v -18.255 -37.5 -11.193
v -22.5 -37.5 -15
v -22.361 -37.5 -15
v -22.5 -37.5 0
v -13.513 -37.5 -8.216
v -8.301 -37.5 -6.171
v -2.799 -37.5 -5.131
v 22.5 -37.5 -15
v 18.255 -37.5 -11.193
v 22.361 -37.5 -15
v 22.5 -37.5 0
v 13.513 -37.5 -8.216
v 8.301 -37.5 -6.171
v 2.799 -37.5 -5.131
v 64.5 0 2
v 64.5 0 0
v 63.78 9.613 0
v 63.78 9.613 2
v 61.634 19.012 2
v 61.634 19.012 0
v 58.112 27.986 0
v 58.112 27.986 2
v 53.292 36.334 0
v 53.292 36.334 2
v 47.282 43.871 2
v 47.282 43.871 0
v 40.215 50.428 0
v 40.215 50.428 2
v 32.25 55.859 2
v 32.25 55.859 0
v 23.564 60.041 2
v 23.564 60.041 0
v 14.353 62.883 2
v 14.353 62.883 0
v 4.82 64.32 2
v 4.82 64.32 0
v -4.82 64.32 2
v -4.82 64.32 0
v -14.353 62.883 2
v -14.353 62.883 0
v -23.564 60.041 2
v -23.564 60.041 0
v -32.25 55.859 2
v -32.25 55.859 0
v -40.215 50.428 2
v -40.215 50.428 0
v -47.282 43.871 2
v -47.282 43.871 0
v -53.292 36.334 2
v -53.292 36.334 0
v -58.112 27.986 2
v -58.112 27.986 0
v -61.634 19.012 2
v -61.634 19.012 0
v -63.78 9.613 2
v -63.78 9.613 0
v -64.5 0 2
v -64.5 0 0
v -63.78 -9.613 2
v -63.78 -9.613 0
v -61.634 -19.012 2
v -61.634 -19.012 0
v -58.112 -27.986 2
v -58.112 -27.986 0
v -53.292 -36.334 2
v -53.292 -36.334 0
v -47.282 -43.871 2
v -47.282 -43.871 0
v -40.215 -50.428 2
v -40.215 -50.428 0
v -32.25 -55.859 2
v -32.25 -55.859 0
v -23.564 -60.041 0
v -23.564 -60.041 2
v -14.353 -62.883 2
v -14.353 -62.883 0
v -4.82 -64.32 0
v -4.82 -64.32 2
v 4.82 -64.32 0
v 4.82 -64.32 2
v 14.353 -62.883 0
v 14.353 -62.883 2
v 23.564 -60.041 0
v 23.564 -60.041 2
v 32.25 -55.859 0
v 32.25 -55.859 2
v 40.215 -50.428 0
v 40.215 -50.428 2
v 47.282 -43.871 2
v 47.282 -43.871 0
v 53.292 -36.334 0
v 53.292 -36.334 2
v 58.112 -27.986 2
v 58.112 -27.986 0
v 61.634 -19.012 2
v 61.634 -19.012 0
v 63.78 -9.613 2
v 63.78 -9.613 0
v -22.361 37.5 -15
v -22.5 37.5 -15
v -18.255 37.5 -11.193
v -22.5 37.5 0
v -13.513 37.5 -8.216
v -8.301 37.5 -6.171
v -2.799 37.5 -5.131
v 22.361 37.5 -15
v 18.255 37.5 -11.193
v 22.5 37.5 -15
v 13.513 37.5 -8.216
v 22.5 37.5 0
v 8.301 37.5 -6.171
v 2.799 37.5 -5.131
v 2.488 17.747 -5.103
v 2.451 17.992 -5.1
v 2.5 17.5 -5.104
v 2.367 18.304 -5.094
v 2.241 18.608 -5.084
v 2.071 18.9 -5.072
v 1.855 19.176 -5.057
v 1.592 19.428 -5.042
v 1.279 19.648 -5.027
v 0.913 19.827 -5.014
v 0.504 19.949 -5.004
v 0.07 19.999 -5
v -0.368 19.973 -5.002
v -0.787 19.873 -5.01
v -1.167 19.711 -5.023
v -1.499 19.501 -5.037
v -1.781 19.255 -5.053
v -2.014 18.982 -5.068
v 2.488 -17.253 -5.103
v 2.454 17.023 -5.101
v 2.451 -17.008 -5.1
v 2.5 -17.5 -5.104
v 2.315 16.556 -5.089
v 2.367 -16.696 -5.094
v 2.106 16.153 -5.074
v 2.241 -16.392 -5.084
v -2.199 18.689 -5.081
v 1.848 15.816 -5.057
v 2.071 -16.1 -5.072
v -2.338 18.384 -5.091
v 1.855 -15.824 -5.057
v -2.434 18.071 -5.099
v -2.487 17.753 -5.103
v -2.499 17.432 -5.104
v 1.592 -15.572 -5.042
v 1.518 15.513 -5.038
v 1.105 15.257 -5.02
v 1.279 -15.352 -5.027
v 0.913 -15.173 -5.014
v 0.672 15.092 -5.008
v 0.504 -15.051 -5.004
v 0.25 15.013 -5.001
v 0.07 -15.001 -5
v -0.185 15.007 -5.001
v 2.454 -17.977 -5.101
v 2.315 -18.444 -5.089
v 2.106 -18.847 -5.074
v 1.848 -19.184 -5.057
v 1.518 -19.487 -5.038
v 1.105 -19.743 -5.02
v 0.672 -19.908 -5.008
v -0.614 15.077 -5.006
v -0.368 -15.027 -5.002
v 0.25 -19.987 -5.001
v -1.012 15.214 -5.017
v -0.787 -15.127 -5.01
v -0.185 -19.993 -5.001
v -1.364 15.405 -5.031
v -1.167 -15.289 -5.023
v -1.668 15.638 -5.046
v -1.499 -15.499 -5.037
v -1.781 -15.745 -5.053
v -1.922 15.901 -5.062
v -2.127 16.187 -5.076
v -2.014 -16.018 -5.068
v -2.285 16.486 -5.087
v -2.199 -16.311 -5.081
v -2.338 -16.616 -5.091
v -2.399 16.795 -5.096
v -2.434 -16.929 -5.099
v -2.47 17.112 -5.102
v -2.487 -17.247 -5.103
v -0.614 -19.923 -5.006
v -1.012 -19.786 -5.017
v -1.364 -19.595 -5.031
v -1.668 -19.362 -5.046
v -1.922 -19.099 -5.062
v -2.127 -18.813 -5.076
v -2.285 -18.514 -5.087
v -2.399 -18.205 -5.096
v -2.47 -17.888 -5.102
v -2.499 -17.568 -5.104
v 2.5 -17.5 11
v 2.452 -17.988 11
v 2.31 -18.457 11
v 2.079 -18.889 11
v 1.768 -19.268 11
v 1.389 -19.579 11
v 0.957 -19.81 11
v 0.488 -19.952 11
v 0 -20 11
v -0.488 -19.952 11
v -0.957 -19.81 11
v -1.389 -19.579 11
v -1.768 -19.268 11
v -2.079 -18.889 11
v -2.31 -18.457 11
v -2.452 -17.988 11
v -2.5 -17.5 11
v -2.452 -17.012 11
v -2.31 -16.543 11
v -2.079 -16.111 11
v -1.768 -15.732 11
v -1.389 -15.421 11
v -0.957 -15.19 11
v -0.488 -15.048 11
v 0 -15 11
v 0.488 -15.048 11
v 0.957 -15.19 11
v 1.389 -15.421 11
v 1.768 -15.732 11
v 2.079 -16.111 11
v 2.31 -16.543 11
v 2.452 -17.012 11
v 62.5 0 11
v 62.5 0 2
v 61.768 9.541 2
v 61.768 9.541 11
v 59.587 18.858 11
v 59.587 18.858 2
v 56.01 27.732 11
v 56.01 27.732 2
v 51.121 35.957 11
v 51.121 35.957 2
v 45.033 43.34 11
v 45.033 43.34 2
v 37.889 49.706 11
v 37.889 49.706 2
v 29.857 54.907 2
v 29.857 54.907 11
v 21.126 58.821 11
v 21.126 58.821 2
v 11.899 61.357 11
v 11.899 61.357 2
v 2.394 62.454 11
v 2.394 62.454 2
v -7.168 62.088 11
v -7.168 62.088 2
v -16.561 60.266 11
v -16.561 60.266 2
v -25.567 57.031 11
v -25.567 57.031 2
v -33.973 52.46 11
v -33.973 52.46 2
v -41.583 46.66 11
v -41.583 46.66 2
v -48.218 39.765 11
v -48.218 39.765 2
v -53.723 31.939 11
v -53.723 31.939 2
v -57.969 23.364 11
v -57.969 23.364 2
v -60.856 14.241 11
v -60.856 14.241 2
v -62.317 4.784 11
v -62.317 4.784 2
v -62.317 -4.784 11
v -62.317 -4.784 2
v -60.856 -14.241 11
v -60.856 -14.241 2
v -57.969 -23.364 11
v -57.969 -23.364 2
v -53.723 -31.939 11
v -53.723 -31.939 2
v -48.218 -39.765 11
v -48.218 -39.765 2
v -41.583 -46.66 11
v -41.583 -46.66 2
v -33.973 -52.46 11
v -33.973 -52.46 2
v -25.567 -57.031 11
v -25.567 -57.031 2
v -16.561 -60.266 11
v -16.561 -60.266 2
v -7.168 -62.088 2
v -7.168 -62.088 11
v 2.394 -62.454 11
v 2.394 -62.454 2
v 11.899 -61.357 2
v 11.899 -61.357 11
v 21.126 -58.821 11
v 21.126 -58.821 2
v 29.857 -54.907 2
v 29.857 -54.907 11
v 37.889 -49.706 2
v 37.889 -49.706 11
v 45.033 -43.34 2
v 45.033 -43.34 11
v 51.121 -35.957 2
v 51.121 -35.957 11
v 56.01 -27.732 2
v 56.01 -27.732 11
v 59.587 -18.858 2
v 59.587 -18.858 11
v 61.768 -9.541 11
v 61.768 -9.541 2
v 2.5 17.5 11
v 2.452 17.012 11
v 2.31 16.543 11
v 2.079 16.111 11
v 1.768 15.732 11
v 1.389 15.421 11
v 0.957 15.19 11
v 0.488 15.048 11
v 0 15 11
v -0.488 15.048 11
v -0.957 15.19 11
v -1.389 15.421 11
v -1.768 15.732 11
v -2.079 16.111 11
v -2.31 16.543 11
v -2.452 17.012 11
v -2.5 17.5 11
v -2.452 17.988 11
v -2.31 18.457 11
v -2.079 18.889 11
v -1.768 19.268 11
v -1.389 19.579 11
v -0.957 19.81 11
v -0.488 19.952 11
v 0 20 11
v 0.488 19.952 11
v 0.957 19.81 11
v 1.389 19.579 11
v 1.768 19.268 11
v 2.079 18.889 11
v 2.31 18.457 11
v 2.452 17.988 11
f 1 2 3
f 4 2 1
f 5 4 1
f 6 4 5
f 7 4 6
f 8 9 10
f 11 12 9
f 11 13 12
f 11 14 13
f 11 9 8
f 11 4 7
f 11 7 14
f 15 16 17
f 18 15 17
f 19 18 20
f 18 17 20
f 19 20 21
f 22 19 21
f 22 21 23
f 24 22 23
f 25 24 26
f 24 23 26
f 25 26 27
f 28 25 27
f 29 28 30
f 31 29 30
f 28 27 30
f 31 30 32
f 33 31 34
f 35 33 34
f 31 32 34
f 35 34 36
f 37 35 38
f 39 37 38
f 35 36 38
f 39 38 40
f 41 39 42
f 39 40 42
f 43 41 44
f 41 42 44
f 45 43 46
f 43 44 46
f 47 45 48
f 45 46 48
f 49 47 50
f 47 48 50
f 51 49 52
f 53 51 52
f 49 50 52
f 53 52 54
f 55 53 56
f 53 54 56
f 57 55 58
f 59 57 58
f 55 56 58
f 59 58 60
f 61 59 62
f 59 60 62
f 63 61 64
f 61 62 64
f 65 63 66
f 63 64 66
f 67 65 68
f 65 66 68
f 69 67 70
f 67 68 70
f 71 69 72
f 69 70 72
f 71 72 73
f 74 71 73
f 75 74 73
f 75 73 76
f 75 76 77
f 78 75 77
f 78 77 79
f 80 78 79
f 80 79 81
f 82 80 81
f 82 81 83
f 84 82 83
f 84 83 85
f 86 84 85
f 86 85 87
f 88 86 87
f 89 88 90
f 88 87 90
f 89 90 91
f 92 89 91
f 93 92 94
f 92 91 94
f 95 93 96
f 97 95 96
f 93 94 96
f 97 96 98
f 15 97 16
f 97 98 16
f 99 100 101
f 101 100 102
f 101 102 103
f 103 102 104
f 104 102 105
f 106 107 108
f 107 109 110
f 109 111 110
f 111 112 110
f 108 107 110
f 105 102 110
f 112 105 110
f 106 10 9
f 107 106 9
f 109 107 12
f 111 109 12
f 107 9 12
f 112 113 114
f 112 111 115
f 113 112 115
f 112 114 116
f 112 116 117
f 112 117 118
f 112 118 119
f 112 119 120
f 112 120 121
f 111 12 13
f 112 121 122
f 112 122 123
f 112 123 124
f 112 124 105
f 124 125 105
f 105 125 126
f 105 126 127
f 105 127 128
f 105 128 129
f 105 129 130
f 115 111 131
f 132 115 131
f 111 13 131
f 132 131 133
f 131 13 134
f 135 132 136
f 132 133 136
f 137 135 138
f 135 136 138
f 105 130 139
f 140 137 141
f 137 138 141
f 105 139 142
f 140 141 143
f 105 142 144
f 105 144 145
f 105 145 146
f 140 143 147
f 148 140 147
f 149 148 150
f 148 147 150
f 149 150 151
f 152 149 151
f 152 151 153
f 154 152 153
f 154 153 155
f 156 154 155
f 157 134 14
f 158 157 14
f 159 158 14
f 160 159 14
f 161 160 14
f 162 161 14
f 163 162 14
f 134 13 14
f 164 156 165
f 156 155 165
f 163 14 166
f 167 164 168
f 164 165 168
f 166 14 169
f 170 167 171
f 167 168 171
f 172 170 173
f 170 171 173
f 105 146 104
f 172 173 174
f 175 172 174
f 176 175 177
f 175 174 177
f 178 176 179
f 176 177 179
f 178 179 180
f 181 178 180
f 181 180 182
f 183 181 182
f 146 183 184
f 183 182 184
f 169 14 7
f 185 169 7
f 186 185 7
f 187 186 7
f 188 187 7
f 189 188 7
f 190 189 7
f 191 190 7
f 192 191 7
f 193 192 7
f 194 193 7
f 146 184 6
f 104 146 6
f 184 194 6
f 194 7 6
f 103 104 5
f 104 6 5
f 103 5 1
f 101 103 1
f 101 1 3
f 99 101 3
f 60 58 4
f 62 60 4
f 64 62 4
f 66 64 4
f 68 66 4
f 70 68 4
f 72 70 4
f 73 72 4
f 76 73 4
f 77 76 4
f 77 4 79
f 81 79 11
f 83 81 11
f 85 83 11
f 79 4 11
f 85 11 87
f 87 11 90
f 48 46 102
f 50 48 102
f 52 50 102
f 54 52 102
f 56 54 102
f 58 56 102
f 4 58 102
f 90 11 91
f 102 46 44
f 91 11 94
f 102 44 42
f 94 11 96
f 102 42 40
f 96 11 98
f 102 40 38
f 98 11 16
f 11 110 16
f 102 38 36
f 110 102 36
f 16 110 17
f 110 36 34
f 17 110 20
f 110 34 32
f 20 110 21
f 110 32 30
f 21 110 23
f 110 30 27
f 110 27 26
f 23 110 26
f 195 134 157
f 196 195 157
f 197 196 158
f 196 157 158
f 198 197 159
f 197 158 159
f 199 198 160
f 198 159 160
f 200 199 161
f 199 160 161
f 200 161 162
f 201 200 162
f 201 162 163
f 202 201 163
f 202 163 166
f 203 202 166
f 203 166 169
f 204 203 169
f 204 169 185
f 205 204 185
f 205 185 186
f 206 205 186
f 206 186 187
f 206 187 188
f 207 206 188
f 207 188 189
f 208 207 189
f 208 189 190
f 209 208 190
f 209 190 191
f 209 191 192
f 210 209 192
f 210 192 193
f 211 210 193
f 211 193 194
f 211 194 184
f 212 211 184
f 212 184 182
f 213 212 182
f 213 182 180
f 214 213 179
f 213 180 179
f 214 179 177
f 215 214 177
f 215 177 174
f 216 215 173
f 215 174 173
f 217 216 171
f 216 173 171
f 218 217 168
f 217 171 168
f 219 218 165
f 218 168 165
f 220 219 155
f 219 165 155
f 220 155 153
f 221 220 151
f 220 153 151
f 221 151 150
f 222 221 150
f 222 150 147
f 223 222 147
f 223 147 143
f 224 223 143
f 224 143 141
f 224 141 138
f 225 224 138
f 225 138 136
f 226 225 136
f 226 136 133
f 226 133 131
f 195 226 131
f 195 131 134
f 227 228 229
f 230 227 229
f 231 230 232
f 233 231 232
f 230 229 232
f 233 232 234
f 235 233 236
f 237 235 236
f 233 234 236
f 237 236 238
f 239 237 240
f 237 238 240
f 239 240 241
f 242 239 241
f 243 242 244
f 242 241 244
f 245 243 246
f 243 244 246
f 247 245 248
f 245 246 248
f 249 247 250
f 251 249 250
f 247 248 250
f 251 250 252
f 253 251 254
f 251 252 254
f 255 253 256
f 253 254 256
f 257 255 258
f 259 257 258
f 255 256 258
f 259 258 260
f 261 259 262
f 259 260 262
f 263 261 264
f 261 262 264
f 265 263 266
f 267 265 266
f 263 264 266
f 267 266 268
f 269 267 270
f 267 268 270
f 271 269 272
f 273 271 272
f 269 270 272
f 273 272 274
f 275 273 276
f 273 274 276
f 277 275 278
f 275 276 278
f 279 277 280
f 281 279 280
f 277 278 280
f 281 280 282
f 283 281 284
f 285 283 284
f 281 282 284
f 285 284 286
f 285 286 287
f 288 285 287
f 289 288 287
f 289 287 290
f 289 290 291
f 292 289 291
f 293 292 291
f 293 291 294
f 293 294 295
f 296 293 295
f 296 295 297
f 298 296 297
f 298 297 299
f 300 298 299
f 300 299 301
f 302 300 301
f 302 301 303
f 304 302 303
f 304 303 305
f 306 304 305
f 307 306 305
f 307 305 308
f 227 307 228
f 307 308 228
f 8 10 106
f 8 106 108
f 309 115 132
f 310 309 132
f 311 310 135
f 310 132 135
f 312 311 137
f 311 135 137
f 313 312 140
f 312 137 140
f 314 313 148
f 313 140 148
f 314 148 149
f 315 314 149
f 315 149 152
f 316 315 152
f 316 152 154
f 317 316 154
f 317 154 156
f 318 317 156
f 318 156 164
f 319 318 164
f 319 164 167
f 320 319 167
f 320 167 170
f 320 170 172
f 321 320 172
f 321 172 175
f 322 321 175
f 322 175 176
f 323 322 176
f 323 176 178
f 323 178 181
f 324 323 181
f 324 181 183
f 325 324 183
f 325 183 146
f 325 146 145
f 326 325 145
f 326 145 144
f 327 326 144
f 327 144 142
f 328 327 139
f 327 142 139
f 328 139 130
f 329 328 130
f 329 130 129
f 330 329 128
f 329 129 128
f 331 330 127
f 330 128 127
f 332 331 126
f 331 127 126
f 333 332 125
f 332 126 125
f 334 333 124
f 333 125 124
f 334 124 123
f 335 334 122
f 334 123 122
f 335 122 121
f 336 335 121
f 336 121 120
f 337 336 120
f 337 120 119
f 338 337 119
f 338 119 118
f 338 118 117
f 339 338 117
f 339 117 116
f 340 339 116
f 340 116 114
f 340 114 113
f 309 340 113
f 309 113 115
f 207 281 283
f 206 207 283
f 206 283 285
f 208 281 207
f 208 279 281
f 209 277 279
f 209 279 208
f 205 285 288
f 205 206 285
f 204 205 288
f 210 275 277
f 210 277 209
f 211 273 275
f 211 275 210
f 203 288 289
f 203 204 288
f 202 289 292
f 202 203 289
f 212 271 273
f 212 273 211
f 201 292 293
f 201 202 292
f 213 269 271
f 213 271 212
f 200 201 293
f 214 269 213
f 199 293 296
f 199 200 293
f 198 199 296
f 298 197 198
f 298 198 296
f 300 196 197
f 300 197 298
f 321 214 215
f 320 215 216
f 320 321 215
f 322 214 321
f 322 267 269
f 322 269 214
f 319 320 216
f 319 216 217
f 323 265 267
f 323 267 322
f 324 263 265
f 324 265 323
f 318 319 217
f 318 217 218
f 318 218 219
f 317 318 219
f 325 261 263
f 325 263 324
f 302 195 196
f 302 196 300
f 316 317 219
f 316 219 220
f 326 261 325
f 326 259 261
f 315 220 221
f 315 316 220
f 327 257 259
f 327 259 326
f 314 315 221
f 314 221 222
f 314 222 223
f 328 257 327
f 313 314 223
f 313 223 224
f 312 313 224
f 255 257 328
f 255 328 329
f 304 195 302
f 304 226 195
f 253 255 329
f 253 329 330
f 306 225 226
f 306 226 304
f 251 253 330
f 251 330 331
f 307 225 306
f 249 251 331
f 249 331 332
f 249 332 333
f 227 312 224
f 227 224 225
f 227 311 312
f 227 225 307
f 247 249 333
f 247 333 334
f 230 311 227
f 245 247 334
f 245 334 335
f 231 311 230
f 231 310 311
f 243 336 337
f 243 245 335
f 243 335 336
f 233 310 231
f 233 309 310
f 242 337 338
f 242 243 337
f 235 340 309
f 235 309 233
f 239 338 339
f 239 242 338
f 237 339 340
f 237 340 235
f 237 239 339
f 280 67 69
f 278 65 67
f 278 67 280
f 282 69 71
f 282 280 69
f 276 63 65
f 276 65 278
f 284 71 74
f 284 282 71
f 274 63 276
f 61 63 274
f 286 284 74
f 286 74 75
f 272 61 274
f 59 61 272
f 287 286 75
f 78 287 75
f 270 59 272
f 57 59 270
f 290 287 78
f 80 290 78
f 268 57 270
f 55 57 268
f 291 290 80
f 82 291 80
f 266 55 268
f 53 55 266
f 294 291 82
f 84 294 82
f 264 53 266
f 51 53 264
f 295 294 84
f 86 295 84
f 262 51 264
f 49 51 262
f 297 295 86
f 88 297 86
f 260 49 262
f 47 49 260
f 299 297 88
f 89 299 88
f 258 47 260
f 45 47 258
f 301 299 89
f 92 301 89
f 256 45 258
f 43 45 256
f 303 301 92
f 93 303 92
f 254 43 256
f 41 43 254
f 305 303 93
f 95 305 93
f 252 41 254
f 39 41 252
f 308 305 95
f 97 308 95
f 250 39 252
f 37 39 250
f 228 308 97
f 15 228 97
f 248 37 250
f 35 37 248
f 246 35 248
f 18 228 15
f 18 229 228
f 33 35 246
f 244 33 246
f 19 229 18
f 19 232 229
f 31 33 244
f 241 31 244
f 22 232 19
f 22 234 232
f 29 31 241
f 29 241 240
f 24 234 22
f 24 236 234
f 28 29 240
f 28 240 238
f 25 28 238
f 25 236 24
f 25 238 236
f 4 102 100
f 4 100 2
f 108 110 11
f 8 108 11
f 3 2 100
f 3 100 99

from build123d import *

# Parameters (mm, degrees)
F0_R      = 64.5
F1_DEPTH  = 2
F2_R      = 62.5
F3_DEPTH  = 9
F4_W      = 45
F4_H      = 75
F5_DEPTH  = 15
F8_DEPTH  = 75
F9_R      = 2.5
F10_DEPTH = 35


with BuildPart() as f1:
    # F0 (on Top) → F1 (new body)
    with BuildSketch(Plane.XY):
        Circle(F0_R)
    extrude(amount=F1_DEPTH)

    # F2 (on face) → F3 (join)
    with BuildSketch(Plane.XY.offset(2)):
        Circle(F2_R)
    extrude(amount=F3_DEPTH)

    # F4 (on face) → F5 (join)
    with BuildSketch(Plane(origin=(0, 0, 0), x_dir=(1, 0, 0), z_dir=(0, 0, -1))):
        Rectangle(F4_W, F4_H)
    extrude(amount=F5_DEPTH)

    # F7 (on face) → F8 (cut)
    with BuildSketch(Plane.XZ.offset(37.5)):
        with BuildLine():
            Line((-22.360679775, -15), (22.360679775, -15))
            ThreePointArc((22.360679775, -15), (0, -5), (-22.360679775, -15))
        make_face()
    extrude(amount=-F8_DEPTH, mode=Mode.SUBTRACT)

    # F9 (on face) → F10 (cut)
    with BuildSketch(Plane(origin=(0, 0, -15), x_dir=(1, 0, 0), z_dir=(0, 0, -1))):
        with Locations((0, 17.5)):
            Circle(F9_R)
        with Locations((0, -17.5)):
            Circle(F9_R)
    extrude(amount=-F10_DEPTH, mode=Mode.SUBTRACT)


solid = f1.part
